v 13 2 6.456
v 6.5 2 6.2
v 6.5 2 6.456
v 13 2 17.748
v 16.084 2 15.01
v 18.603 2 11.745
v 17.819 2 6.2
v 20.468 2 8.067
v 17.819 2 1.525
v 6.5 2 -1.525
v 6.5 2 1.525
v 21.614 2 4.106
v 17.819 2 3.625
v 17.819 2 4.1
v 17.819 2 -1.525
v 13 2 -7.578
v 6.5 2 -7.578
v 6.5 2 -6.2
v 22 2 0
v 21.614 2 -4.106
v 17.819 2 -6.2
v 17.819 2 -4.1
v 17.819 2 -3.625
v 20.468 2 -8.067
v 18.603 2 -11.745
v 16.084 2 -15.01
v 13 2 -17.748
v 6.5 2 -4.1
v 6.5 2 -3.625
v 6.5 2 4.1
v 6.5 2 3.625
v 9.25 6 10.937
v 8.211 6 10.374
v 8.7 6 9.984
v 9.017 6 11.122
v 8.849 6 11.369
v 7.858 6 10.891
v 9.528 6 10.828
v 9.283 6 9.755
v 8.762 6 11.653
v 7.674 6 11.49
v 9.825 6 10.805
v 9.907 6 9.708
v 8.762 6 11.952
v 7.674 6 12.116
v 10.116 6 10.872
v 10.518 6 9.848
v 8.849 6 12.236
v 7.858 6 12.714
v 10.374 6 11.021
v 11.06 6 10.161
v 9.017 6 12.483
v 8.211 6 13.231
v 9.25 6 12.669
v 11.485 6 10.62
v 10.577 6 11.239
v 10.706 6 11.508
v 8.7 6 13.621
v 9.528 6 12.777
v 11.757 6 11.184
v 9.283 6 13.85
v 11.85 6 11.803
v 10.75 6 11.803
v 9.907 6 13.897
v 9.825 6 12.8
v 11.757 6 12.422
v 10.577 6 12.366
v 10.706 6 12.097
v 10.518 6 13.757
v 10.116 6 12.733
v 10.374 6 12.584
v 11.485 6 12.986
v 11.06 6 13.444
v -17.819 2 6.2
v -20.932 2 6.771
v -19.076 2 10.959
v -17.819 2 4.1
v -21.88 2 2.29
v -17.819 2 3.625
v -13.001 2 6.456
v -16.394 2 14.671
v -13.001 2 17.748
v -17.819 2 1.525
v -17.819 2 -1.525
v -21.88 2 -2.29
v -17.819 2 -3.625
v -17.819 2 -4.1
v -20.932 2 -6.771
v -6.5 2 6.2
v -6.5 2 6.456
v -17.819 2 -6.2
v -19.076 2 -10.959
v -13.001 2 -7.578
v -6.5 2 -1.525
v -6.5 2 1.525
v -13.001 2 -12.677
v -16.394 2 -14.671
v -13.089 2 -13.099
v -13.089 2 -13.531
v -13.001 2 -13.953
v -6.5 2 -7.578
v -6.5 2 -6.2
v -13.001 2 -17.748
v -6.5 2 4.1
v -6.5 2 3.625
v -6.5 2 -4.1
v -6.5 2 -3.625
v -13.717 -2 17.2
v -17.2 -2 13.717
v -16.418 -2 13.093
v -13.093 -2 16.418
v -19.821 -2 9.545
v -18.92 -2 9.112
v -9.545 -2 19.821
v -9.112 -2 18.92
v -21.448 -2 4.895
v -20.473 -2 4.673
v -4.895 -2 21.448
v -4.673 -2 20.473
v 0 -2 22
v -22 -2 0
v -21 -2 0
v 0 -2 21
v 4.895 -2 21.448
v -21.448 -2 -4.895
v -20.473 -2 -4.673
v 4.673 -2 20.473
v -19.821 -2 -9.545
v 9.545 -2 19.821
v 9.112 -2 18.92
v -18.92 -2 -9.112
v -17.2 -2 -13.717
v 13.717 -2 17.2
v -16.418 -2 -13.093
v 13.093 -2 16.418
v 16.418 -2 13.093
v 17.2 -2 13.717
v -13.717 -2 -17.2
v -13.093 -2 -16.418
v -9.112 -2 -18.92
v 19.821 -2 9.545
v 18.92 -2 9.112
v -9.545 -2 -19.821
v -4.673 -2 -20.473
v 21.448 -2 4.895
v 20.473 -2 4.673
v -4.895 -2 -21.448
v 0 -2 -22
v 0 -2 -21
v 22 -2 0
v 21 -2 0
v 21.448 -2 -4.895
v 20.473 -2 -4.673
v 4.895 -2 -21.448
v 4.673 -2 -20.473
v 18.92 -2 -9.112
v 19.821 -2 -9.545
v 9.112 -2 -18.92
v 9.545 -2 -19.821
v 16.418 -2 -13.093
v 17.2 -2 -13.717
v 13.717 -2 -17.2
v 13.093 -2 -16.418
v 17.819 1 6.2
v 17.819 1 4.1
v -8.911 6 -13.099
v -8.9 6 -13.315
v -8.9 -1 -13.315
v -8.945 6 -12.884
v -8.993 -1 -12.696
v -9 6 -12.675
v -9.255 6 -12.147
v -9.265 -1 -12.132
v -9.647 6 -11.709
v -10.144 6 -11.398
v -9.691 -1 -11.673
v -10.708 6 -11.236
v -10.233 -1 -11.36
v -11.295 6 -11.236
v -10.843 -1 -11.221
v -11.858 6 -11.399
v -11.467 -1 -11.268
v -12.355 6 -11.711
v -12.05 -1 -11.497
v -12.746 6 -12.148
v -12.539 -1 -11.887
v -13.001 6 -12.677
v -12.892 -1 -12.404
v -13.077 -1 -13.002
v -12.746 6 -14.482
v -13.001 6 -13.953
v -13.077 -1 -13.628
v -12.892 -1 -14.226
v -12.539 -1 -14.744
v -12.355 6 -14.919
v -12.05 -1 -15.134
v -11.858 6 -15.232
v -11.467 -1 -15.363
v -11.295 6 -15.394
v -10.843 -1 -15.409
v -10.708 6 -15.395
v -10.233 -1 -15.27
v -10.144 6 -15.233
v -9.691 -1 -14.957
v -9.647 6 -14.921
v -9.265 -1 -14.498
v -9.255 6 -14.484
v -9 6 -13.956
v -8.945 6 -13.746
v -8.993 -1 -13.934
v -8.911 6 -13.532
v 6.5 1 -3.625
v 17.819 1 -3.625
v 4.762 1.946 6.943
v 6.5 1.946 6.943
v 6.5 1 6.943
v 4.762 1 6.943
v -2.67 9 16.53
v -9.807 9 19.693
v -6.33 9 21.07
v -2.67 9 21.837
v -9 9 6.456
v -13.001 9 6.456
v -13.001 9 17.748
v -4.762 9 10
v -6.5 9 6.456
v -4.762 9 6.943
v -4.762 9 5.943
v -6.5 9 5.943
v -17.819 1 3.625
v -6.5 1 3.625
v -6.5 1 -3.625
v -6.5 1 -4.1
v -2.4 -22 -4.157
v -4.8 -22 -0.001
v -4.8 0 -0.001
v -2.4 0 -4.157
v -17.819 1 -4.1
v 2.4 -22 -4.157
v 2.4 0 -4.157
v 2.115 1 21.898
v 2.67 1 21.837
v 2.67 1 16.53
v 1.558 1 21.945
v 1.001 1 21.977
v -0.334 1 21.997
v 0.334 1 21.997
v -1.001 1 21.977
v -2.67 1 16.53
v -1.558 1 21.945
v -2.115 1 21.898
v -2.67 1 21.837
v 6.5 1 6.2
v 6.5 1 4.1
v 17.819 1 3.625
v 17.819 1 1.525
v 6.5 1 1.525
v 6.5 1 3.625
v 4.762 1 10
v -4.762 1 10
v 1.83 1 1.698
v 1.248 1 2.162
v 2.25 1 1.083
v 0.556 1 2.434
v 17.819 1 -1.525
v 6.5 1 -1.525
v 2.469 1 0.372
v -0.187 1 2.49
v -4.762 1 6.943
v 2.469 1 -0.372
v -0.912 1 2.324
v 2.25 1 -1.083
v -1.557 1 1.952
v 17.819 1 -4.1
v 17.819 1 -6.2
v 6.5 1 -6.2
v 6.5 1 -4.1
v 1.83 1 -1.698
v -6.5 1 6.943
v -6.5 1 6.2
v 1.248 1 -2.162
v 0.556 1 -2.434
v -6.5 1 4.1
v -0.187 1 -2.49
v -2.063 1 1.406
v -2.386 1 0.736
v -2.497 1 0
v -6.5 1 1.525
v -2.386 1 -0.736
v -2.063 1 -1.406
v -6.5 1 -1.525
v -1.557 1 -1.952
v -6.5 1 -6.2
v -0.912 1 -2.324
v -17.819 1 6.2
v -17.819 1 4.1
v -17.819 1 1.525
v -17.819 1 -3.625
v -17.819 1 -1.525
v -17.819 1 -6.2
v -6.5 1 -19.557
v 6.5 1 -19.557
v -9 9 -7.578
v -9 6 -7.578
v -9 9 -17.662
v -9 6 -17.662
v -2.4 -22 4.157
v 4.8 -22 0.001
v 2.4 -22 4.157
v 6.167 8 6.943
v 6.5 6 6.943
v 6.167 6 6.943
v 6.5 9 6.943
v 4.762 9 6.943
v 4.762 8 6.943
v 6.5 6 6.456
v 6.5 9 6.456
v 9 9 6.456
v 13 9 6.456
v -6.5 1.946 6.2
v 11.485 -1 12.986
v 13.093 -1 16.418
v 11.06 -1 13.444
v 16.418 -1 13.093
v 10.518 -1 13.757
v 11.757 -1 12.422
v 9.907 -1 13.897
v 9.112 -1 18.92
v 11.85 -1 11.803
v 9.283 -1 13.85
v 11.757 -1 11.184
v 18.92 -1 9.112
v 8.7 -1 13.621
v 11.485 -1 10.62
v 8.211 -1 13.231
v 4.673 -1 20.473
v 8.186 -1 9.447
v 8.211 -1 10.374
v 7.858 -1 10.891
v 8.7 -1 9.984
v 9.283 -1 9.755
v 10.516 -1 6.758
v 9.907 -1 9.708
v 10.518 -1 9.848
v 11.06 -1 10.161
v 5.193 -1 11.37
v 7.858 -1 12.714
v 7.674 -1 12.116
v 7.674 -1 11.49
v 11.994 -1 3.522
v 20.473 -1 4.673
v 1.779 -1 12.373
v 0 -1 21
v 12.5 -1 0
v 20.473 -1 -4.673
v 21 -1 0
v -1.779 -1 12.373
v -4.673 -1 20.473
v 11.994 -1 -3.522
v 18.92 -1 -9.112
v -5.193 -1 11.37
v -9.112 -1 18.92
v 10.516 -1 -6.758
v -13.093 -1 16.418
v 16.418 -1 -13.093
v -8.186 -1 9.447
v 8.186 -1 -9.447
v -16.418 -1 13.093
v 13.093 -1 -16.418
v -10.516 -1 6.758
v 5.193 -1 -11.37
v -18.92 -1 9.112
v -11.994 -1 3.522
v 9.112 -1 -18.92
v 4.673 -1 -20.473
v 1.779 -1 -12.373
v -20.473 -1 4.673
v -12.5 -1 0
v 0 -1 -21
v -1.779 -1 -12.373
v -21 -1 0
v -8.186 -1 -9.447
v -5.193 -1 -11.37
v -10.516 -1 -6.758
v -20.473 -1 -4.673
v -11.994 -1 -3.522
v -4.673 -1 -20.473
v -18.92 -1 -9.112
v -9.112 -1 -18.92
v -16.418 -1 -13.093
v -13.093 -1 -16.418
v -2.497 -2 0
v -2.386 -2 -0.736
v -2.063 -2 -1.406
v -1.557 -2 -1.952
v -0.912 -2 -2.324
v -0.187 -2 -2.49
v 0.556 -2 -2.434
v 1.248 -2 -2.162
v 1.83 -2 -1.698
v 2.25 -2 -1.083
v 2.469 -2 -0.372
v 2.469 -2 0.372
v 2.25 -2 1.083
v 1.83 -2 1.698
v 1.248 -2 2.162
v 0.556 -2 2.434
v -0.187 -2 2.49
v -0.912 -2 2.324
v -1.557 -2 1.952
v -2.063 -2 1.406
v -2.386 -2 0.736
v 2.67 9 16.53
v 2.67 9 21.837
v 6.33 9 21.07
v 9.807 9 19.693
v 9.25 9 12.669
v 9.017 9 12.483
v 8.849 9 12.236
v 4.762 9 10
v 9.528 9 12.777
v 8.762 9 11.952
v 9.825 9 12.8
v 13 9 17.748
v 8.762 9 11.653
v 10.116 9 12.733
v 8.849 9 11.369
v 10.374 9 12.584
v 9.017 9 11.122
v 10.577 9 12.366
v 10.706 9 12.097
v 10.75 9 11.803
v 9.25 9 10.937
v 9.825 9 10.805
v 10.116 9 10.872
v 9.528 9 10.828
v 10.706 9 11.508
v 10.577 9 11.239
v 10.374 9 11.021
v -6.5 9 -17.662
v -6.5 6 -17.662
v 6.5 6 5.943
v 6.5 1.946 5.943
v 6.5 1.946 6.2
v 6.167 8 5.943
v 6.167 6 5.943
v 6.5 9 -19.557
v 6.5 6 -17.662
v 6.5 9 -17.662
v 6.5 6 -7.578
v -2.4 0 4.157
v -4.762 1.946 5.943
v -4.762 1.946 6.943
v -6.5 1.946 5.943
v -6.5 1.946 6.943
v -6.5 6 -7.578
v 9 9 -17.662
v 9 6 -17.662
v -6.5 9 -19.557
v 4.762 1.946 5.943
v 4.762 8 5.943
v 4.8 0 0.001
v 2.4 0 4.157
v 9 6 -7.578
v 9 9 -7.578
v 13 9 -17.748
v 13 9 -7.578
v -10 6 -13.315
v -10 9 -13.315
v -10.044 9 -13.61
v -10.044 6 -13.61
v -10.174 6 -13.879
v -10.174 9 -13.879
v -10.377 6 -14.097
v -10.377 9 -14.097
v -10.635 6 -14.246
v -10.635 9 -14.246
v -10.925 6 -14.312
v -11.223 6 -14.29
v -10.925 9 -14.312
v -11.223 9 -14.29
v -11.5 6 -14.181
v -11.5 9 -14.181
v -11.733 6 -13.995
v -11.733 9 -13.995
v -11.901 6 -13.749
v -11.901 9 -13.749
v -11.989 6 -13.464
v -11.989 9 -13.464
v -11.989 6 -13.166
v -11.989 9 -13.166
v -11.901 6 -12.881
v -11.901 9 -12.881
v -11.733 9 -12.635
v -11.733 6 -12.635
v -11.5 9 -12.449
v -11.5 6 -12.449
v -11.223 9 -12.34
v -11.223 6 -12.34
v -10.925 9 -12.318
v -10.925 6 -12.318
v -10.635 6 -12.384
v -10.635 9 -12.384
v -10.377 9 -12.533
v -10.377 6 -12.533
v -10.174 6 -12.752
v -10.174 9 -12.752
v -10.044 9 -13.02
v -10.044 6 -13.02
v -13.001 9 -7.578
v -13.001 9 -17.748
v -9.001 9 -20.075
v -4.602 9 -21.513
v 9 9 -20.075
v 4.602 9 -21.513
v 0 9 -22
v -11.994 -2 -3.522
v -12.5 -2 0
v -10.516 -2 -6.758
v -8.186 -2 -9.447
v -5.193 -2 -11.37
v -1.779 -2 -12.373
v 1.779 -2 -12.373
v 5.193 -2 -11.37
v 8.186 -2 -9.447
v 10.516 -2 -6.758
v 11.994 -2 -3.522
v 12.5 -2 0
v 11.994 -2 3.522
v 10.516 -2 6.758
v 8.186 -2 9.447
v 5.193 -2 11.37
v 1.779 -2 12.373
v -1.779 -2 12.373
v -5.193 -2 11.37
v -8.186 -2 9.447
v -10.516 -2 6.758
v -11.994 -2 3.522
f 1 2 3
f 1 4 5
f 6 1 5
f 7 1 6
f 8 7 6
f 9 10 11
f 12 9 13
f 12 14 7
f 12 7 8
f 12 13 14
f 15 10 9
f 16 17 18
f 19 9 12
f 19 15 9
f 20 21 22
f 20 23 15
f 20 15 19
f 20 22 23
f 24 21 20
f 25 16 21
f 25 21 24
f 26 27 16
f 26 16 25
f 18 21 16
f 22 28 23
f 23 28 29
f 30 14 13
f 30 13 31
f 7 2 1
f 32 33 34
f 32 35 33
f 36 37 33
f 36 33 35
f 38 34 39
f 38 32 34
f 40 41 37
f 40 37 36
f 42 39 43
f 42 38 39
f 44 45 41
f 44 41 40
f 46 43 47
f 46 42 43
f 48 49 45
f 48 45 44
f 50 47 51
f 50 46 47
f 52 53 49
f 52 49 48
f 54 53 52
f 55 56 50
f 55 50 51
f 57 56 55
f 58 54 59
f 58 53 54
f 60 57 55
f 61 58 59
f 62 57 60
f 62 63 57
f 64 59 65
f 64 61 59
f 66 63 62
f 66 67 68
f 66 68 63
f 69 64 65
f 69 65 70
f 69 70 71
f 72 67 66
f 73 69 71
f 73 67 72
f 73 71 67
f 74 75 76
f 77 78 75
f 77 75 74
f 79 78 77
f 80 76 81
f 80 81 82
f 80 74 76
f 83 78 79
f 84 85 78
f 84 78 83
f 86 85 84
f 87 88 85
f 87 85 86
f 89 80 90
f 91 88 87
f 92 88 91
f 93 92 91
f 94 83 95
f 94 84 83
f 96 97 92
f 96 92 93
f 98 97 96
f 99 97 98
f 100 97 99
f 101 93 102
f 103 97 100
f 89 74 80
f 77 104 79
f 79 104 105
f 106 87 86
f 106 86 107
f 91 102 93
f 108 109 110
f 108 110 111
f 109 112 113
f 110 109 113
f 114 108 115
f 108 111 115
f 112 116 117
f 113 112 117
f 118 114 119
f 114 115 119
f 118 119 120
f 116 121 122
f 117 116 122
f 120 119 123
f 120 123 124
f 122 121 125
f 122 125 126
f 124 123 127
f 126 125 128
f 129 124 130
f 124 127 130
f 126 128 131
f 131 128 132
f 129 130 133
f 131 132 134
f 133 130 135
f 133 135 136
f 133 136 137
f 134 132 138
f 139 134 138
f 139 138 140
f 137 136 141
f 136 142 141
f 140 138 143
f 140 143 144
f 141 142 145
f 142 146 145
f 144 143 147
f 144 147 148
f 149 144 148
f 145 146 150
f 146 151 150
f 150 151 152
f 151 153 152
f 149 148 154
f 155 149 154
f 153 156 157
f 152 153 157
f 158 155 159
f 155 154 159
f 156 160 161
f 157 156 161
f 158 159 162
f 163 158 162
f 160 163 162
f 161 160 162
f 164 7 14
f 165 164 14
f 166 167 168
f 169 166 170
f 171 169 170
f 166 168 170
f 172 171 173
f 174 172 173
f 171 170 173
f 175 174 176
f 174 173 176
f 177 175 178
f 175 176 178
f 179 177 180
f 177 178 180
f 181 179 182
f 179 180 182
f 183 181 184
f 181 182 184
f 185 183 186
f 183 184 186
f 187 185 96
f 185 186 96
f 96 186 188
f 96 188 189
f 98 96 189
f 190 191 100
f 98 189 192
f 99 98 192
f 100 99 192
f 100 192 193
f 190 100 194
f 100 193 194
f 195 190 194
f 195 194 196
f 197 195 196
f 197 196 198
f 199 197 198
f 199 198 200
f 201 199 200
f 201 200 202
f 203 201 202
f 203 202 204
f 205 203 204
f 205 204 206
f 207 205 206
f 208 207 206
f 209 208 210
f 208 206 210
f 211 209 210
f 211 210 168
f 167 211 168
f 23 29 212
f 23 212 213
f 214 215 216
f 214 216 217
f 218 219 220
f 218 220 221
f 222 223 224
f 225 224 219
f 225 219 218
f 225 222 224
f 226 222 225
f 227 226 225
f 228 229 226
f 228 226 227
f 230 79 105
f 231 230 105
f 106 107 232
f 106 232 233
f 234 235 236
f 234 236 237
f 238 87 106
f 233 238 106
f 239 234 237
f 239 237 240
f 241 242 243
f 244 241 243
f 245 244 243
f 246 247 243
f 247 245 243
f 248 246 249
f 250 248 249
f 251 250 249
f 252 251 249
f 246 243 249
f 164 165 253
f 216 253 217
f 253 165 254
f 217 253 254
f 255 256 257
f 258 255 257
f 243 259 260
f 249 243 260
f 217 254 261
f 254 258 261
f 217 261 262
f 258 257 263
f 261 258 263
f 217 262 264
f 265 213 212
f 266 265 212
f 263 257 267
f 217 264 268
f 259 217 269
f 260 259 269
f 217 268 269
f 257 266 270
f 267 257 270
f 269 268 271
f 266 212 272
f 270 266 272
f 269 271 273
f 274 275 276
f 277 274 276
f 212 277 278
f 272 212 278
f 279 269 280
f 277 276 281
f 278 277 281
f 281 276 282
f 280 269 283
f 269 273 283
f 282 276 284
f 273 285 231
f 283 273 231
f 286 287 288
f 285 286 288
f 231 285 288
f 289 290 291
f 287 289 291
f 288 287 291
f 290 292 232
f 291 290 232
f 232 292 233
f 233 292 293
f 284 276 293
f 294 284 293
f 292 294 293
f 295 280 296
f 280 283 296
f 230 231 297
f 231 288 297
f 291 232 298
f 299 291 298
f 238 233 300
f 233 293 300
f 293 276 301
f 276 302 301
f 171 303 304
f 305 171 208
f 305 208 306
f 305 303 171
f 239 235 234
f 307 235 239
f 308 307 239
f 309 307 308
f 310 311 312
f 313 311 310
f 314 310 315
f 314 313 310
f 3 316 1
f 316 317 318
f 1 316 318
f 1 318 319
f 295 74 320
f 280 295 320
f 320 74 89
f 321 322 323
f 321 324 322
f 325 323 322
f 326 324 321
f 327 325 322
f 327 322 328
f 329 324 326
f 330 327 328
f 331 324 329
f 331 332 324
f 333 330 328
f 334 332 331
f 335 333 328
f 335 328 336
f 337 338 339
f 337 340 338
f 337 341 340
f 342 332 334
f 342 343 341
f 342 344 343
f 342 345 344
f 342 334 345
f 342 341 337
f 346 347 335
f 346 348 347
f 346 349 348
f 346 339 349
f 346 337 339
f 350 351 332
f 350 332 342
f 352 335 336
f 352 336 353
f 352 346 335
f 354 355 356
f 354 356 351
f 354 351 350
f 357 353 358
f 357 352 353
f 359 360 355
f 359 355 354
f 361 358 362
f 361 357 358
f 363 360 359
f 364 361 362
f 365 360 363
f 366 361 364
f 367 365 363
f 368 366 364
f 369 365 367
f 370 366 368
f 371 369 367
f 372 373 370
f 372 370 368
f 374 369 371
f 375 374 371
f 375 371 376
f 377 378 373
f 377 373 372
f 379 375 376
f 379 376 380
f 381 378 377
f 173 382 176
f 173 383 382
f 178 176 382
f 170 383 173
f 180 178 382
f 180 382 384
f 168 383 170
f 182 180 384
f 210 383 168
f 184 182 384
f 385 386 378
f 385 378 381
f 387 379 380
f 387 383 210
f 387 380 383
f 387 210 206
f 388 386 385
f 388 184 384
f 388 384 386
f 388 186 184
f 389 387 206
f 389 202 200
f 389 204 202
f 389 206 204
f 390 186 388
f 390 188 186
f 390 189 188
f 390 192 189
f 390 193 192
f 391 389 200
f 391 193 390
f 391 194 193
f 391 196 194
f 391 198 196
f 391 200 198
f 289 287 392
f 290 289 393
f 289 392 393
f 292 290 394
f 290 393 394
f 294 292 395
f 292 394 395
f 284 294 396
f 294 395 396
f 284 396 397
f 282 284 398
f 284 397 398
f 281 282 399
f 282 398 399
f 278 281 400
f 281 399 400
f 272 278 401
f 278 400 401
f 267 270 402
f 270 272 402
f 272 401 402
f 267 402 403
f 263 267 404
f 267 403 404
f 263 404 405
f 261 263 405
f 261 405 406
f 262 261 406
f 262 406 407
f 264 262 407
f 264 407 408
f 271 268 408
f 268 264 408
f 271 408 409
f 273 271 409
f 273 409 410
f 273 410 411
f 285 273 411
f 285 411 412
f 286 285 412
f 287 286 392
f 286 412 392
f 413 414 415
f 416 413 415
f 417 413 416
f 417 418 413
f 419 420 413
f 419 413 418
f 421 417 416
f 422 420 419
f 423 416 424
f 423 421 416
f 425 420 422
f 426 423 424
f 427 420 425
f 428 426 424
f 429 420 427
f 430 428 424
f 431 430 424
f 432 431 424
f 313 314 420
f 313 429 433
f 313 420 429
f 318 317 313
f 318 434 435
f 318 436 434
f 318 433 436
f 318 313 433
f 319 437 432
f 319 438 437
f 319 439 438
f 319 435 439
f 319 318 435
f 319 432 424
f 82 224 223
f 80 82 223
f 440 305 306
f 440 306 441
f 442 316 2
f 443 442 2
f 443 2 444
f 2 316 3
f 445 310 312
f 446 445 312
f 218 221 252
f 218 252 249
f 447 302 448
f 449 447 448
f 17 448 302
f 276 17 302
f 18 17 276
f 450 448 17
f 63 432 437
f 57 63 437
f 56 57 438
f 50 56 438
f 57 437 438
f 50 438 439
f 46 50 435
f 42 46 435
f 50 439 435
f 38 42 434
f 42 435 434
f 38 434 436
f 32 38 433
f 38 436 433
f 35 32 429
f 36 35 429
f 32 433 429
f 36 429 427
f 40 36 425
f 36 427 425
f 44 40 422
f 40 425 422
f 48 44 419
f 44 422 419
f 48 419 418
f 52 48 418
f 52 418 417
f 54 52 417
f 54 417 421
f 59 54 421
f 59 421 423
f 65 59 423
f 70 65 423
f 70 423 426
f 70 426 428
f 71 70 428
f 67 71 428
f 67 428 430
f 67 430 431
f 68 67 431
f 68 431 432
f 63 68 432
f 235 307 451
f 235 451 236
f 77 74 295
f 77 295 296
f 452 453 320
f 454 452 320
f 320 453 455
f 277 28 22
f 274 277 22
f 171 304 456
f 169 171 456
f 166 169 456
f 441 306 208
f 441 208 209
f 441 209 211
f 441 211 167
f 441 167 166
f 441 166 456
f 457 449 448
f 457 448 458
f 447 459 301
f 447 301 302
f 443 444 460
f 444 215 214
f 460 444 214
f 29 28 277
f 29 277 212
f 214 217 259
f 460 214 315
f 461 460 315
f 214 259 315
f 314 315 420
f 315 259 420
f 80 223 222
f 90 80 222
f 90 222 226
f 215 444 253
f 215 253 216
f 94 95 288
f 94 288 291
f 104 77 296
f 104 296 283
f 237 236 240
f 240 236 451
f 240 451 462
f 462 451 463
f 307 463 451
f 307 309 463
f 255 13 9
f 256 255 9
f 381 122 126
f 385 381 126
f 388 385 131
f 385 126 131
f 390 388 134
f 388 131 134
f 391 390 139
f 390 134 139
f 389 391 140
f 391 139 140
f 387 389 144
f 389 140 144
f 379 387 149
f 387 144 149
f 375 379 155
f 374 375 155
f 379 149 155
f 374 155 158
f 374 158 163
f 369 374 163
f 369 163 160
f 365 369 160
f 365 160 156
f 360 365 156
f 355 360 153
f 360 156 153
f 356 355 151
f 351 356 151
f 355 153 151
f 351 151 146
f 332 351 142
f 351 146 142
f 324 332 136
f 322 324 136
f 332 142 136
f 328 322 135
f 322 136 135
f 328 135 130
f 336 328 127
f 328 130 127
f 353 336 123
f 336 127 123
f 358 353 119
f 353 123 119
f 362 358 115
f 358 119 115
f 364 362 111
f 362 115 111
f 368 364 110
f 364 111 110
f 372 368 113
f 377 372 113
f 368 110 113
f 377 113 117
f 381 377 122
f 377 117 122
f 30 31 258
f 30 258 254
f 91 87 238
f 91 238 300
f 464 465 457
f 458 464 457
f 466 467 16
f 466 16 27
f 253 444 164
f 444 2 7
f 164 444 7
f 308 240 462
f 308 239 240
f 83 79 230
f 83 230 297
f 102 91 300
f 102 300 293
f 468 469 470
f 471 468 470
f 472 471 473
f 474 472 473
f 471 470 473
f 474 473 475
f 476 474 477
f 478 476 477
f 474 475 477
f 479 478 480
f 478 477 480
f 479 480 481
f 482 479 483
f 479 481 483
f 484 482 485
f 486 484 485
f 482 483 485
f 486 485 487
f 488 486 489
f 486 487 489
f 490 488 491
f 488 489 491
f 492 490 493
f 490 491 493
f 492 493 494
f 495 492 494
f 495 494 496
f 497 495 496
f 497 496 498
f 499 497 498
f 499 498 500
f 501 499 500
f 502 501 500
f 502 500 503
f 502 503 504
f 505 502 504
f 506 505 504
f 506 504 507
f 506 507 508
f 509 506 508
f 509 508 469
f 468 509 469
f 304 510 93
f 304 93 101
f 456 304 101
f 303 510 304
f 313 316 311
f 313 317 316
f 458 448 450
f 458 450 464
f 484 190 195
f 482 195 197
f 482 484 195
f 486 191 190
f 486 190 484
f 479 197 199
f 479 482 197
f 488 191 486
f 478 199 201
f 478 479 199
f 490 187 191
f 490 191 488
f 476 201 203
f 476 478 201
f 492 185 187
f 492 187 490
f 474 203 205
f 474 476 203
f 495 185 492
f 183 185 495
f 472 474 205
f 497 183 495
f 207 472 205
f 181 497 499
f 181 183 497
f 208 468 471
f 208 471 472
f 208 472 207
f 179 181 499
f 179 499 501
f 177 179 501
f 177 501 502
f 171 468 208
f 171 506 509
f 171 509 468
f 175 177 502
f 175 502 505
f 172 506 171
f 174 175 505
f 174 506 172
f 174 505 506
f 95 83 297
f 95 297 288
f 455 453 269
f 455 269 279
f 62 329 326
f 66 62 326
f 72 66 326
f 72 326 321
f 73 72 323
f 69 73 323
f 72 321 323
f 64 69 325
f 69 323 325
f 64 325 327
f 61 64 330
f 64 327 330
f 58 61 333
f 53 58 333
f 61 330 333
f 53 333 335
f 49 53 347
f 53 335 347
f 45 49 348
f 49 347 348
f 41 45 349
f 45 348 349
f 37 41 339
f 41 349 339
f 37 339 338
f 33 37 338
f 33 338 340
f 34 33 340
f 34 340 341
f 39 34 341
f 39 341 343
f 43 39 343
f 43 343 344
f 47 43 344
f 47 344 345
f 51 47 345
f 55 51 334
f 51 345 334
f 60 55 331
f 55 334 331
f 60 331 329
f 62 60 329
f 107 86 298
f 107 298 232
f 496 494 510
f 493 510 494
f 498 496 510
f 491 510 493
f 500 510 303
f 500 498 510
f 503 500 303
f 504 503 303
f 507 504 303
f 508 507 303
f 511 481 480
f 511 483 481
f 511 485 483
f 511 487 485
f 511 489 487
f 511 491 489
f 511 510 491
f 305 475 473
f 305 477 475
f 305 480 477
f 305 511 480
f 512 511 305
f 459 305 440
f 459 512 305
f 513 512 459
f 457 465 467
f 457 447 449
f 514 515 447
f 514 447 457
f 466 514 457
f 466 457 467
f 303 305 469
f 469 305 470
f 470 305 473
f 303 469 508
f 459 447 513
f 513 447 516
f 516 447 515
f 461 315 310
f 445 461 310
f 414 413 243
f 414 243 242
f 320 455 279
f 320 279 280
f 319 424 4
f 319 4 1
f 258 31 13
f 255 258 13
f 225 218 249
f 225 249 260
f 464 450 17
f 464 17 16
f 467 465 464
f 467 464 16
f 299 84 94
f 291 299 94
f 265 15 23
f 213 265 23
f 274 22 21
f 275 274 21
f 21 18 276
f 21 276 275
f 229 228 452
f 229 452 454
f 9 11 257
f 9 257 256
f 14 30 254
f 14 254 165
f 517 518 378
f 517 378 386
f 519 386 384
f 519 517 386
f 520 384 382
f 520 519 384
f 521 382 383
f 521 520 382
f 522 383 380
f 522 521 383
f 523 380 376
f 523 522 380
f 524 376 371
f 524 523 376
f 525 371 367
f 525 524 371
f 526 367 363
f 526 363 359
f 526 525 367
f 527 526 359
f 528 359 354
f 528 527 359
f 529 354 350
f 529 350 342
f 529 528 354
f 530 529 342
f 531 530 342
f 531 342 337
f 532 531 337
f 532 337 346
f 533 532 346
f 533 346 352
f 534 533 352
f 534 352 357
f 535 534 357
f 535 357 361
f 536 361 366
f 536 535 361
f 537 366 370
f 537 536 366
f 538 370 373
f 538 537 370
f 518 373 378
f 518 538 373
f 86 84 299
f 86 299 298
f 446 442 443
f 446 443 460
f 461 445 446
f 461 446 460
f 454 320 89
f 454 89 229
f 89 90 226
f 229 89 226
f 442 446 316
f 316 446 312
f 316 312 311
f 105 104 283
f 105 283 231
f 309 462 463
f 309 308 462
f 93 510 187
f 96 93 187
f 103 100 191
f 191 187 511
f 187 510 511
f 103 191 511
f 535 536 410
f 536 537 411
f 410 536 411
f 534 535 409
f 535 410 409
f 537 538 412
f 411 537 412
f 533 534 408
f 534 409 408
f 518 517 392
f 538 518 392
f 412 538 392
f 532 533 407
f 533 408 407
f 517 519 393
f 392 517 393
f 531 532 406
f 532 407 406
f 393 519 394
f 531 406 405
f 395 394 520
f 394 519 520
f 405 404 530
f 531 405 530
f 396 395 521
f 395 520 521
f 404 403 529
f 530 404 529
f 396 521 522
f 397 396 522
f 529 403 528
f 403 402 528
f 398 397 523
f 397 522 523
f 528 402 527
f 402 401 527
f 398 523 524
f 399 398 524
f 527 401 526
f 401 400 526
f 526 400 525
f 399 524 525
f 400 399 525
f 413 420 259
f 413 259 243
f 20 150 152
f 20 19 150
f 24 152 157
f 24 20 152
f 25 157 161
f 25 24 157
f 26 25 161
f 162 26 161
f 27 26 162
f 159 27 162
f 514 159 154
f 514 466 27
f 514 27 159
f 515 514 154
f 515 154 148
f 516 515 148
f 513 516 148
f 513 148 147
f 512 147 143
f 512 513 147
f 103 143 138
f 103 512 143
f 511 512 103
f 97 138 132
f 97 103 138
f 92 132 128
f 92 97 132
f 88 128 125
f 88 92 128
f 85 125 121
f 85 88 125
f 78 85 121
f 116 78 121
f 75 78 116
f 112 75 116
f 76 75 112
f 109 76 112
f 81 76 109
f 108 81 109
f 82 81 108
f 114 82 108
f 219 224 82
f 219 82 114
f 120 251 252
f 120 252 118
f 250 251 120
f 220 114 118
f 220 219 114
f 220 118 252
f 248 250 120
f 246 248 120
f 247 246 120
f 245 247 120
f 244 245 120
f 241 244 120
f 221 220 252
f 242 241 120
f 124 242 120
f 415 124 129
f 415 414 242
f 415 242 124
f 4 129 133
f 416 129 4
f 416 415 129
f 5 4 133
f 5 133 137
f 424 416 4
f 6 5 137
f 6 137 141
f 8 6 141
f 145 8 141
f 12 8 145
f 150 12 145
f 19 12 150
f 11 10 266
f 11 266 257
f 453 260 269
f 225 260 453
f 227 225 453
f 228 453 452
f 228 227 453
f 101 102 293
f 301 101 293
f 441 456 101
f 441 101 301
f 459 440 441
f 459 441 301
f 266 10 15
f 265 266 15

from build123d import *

# Parameters (mm, degrees)
SKETCH1_R                = 22
BOSS_EXTRUDE1_DEPTH      = 9
BOSS_EXTRUDE1_DEPTH_BACK = 2
SKETCH6_R                = 21
SKETCH6_R_2              = 12.5
CUT_EXTRUDE5_DEPTH       = 1
SKETCH7_R                = 8.5
BOSS_EXTRUDE2_DEPTH      = 40
SKETCH8_R                = 1.5
CUT_EXTRUDE6_DEPTH       = 41
CUT_EXTRUDE6_DEPTH_BACK  = 12
CUT_EXTRUDE7_DEPTH       = 7
SKETCH17_R               = 2.496785081
CUT_EXTRUDE14_DEPTH      = 62
SKETCH29_W               = 18
SKETCH29_H               = 24.118038922
CUT_EXTRUDE19_DEPTH      = 3
SKETCH30_W               = 2.5
SKETCH30_H               = 14
CUT_EXTRUDE20_DEPTH      = 6
SKETCH35_R               = 9.1
SKETCH35_R_2             = 8.5
BOSS_EXTRUDE4_DEPTH      = 2
BOSS_EXTRUDE4_DEPTH_BACK = 2
SKETCH36_R               = 8.5
SKETCH36_R_2             = 8.3
CUT_EXTRUDE28_DEPTH      = 1.5
CUT_EXTRUDE28_DEPTH_BACK = 1.5
SKETCH39_R               = 8.5
SKETCH39_R_2             = 8.3
CUT_EXTRUDE30_DEPTH      = 1.5
CUT_EXTRUDE30_DEPTH_BACK = 1.5
SKETCH40_R               = 8.5
SKETCH40_R_2             = 8.3
CUT_EXTRUDE31_DEPTH      = 1.5
CUT_EXTRUDE31_DEPTH_BACK = 1.5
SKETCH41_R               = 8.5
SKETCH41_R_2             = 8.35
CUT_EXTRUDE32_DEPTH      = 1.5
CUT_EXTRUDE32_DEPTH_BACK = 1.5
SKETCH42_R               = 8.5
SKETCH42_R_2             = 8.3
CUT_EXTRUDE33_DEPTH      = 1.5
CUT_EXTRUDE33_DEPTH_BACK = 1.5
SKETCH43_R               = 8.5
SKETCH43_R_2             = 8.3
CUT_EXTRUDE34_DEPTH      = 1.5
CUT_EXTRUDE34_DEPTH_BACK = 1.5
SKETCH44_R               = 1
CUT_EXTRUDE35_DEPTH      = 23
CUT_EXTRUDE35_DEPTH_BACK = 23
SKETCH45_R               = 1
CUT_EXTRUDE36_DEPTH      = 31.052558883
CUT_EXTRUDE36_DEPTH_BACK = 31.052558883
SKETCH46_R               = 1
CUT_EXTRUDE37_DEPTH      = 31.052558883
CUT_EXTRUDE37_DEPTH_BACK = 31.052558883
SKETCH47_W               = 27.732128476
SKETCH47_H               = 14.033639909
CUT_EXTRUDE38_DEPTH      = 7
CUT_EXTRUDE39_DEPTH      = 8
SKETCH48_R               = 1
CUT_EXTRUDE40_DEPTH      = 9
SKETCH50_R               = 6.388253867
BOSS_EXTRUDE5_DEPTH      = 2
SKETCH49_R               = 2.1
CUT_EXTRUDE42_DEPTH      = 7
SKETCH51_W               = 35.63730279
SKETCH51_H               = 2.1
CUT_EXTRUDE43_DEPTH      = 1
SKETCH53_R               = 9.1
CUT_EXTRUDE45_DEPTH      = 40
SKETCH55_W               = 1.737607108
SKETCH55_H               = 7.054348591
BOSS_EXTRUDE6_DEPTH      = 1
BOSS_EXTRUDE9_DEPTH      = 20
BOSS_EXTRUDE9_DEPTH_BACK = 2


with BuildPart() as part:
    # Sketch1 → Boss-Extrude1 (new body, two sides)
    with BuildSketch(Plane(origin=(0, 0, 0), x_dir=(1, 0, 0), z_dir=(0, 1, 0))) as boss_extrude1_sk:
        Circle(SKETCH1_R)
    extrude(amount=BOSS_EXTRUDE1_DEPTH)
    extrude(boss_extrude1_sk.sketch, amount=-BOSS_EXTRUDE1_DEPTH_BACK)

    # Sketch6 → Cut-Extrude5 (cut)
    with BuildSketch(Plane(origin=(0, -2, 0), x_dir=(-1, 0, 0), z_dir=(0, -1, 0))):
        Circle(SKETCH6_R)
        Circle(SKETCH6_R_2, mode=Mode.SUBTRACT)
    extrude(amount=-CUT_EXTRUDE5_DEPTH, mode=Mode.SUBTRACT)

    # Sketch7 → Boss-Extrude2 (add)
    with BuildSketch(Plane(origin=(0, -2, 0), x_dir=(-1, 0, 0), z_dir=(0, -1, 0))):
        Circle(SKETCH7_R)
    extrude(amount=BOSS_EXTRUDE2_DEPTH)

    # Sketch8 → Cut-Extrude6 (cut, two sides)
    with BuildSketch(Plane(origin=(0, -2, 0), x_dir=(-1, 0, 0), z_dir=(0, -1, 0))) as cut_extrude6_sk:
        Circle(SKETCH8_R)
    extrude(amount=CUT_EXTRUDE6_DEPTH, mode=Mode.SUBTRACT)
    extrude(cut_extrude6_sk.sketch, amount=-CUT_EXTRUDE6_DEPTH_BACK, mode=Mode.SUBTRACT)

    # Sketch9 → Cut-Extrude7 (cut)
    with BuildSketch(Plane(origin=(0, 9, 0), x_dir=(1, 0, 0), z_dir=(0, 1, 0))):
        with BuildLine():
            Line((-13.000713231, -20.359249211), (-13.000713231, 20.359249211))
            ThreePointArc((-13.000713231, 20.359249211), (-24.156108398, 0), (-13.000713231, -20.359249211))
        make_face()
        with BuildLine():
            Line((13, -20.359704638), (13, 20.359704638))
            ThreePointArc((13, 20.359704638), (24.156108398, 0), (13, -20.359704638))
        make_face()
    extrude(amount=-CUT_EXTRUDE7_DEPTH, mode=Mode.SUBTRACT)

    # Sketch17 → Cut-Extrude14 (cut)
    with BuildSketch(Plane(origin=(0, -42, 0), x_dir=(-1, 0, 0), z_dir=(0, -1, 0))):
        Circle(SKETCH17_R)
    extrude(amount=-CUT_EXTRUDE14_DEPTH, mode=Mode.SUBTRACT)

    # Sketch29 → Cut-Extrude19 (cut)
    with BuildSketch(Plane(origin=(0, 9, 0), x_dir=(1, 0, 0), z_dir=(0, 1, 0))):
        with Locations((0, 5.603215798)):
            Rectangle(SKETCH29_W, SKETCH29_H)
    extrude(amount=-CUT_EXTRUDE19_DEPTH, mode=Mode.SUBTRACT)

    # Sketch30 → Cut-Extrude20 (cut)
    with BuildSketch(Plane(origin=(0, 9, 0), x_dir=(1, 0, 0), z_dir=(0, 1, 0))):
        with Locations((6.752146467, 0.544196337)):
            Rectangle(SKETCH30_W, SKETCH30_H)
        with Locations((-6.752146467, 0.544196337)):
            Rectangle(SKETCH30_W, SKETCH30_H)
    extrude(amount=-CUT_EXTRUDE20_DEPTH, mode=Mode.SUBTRACT)

    # Sketch35 → Boss-Extrude4 (add, two sides)
    with BuildSketch(Plane(origin=(0, -6.5, 0), x_dir=(1, 0, 0), z_dir=(0, 1, 0))) as boss_extrude4_sk:
        Circle(SKETCH35_R)
        Circle(SKETCH35_R_2, mode=Mode.SUBTRACT)
    extrude(amount=BOSS_EXTRUDE4_DEPTH)
    extrude(boss_extrude4_sk.sketch, amount=-BOSS_EXTRUDE4_DEPTH_BACK)

    # Sketch36 → Cut-Extrude28 (cut, two sides)
    with BuildSketch(Plane(origin=(0, -17, 0), x_dir=(1, 0, 0), z_dir=(0, 1, 0))) as cut_extrude28_sk:
        Circle(SKETCH36_R)
        Circle(SKETCH36_R_2, mode=Mode.SUBTRACT)
    extrude(amount=CUT_EXTRUDE28_DEPTH, mode=Mode.SUBTRACT)
    extrude(cut_extrude28_sk.sketch, amount=-CUT_EXTRUDE28_DEPTH_BACK, mode=Mode.SUBTRACT)

    # Sketch39 → Cut-Extrude30 (cut, two sides)
    with BuildSketch(Plane(origin=(0, -21, 0), x_dir=(1, 0, 0), z_dir=(0, 1, 0))) as cut_extrude30_sk:
        Circle(SKETCH39_R)
        Circle(SKETCH39_R_2, mode=Mode.SUBTRACT)
    extrude(amount=CUT_EXTRUDE30_DEPTH, mode=Mode.SUBTRACT)
    extrude(cut_extrude30_sk.sketch, amount=-CUT_EXTRUDE30_DEPTH_BACK, mode=Mode.SUBTRACT)

    # Sketch40 → Cut-Extrude31 (cut, two sides)
    with BuildSketch(Plane(origin=(0, -25, 0), x_dir=(1, 0, 0), z_dir=(0, 1, 0))) as cut_extrude31_sk:
        Circle(SKETCH40_R)
        Circle(SKETCH40_R_2, mode=Mode.SUBTRACT)
    extrude(amount=CUT_EXTRUDE31_DEPTH, mode=Mode.SUBTRACT)
    extrude(cut_extrude31_sk.sketch, amount=-CUT_EXTRUDE31_DEPTH_BACK, mode=Mode.SUBTRACT)

    # Sketch41 → Cut-Extrude32 (cut, two sides)
    with BuildSketch(Plane(origin=(0, -29, 0), x_dir=(1, 0, 0), z_dir=(0, 1, 0))) as cut_extrude32_sk:
        Circle(SKETCH41_R)
        Circle(SKETCH41_R_2, mode=Mode.SUBTRACT)
    extrude(amount=CUT_EXTRUDE32_DEPTH, mode=Mode.SUBTRACT)
    extrude(cut_extrude32_sk.sketch, amount=-CUT_EXTRUDE32_DEPTH_BACK, mode=Mode.SUBTRACT)

    # Sketch42 → Cut-Extrude33 (cut, two sides)
    with BuildSketch(Plane(origin=(0, -33, 0), x_dir=(1, 0, 0), z_dir=(0, 1, 0))) as cut_extrude33_sk:
        Circle(SKETCH42_R)
        Circle(SKETCH42_R_2, mode=Mode.SUBTRACT)
    extrude(amount=CUT_EXTRUDE33_DEPTH, mode=Mode.SUBTRACT)
    extrude(cut_extrude33_sk.sketch, amount=-CUT_EXTRUDE33_DEPTH_BACK, mode=Mode.SUBTRACT)

    # Sketch43 → Cut-Extrude34 (cut, two sides)
    with BuildSketch(Plane(origin=(0, -37, 0), x_dir=(1, 0, 0), z_dir=(0, 1, 0))) as cut_extrude34_sk:
        Circle(SKETCH43_R)
        Circle(SKETCH43_R_2, mode=Mode.SUBTRACT)
    extrude(amount=CUT_EXTRUDE34_DEPTH, mode=Mode.SUBTRACT)
    extrude(cut_extrude34_sk.sketch, amount=-CUT_EXTRUDE34_DEPTH_BACK, mode=Mode.SUBTRACT)

    # Sketch44 → Cut-Extrude35 (cut, two sides)
    with BuildSketch(Plane.XY) as cut_extrude35_sk:
        with Locations((0, -16.975647938)):
            Circle(SKETCH44_R)
        with Locations((0, -29.042179734)):
            Circle(SKETCH44_R)
    extrude(amount=CUT_EXTRUDE35_DEPTH, mode=Mode.SUBTRACT)
    extrude(cut_extrude35_sk.sketch, amount=-CUT_EXTRUDE35_DEPTH_BACK, mode=Mode.SUBTRACT)

    # Sketch45 → Cut-Extrude36 (cut, two sides)
    with BuildSketch(Plane(origin=(0, 0, 0), x_dir=(0, 1, 0), z_dir=(0.866025404, 0, 0.5))) as cut_extrude36_sk:
        with Locations((-21.101513607, 0)):
            Circle(SKETCH45_R)
        with Locations((-33.049455879, 0)):
            Circle(SKETCH45_R)
    extrude(amount=CUT_EXTRUDE36_DEPTH, mode=Mode.SUBTRACT)
    extrude(cut_extrude36_sk.sketch, amount=-CUT_EXTRUDE36_DEPTH_BACK, mode=Mode.SUBTRACT)

    # Sketch46 → Cut-Extrude37 (cut, two sides)
    with BuildSketch(Plane(origin=(0, 0, 0), x_dir=(0, 1, 0), z_dir=(0.866025404, 0, -0.5))) as cut_extrude37_sk:
        with Locations((-24.961001523, 0)):
            Circle(SKETCH46_R)
        with Locations((-37.130366549, 0)):
            Circle(SKETCH46_R)
    extrude(amount=CUT_EXTRUDE37_DEPTH, mode=Mode.SUBTRACT)
    extrude(cut_extrude37_sk.sketch, amount=-CUT_EXTRUDE37_DEPTH_BACK, mode=Mode.SUBTRACT)

    # Sketch47 → Cut-Extrude38 (cut)
    with BuildSketch(Plane(origin=(0, 9, 0), x_dir=(1, 0, 0), z_dir=(0, 1, 0))):
        with Locations((-0.011675811, 0.561016292)):
            Rectangle(SKETCH47_W, SKETCH47_H)
    extrude(amount=-CUT_EXTRUDE38_DEPTH, mode=Mode.SUBTRACT)

    # Sketch23 → Cut-Extrude39 (cut)
    with BuildSketch(Plane(origin=(0, 9, 0), x_dir=(1, 0, 0), z_dir=(0, 1, 0))):
        with BuildLine():
            Line((-2.670420152, -16.85816067), (-2.670420152, -16.530371213))
            Line((-2.670420152, -16.530371213), (-4.762392892, -10))
            Line((-4.762392892, -10), (-4.762392892, -6.943148259))
            Line((-4.762392892, -6.943148259), (-6.5, -6.943148259))
            Line((-6.5, -6.943148259), (-6.5, 19.556851741))
            Line((-6.5, 19.556851741), (6.5, 19.556851741))
            Line((6.5, 19.556851741), (6.5, -6.943148259))
            Line((6.5, -6.943148259), (4.762392892, -6.943148259))
            Line((4.762392892, -6.943148259), (4.762392892, -10))
            Line((4.762392892, -10), (2.670420152, -16.530371213))
            Line((2.670420152, -16.530371213), (2.670420152, -16.85816067))
            Line((2.670420152, -16.85816067), (2.670420152, -21.837327131))
            ThreePointArc((2.670420152, -21.837327131), (1.836835043, -21.92318492), (1.000584871, -21.977234355))
            Line((1.000584871, -21.977234355), (0, -25.25))
            Line((0, -25.25), (-1.000584871, -21.977234355))
            ThreePointArc((-1.000584871, -21.977234355), (-1.836835043, -21.92318492), (-2.670420152, -21.837327131))
            Line((-2.670420152, -21.837327131), (-2.670420152, -16.85816067))
        make_face()
    extrude(amount=-CUT_EXTRUDE39_DEPTH, mode=Mode.SUBTRACT)

    # Sketch48 → Cut-Extrude40 (cut)
    with BuildSketch(Plane(origin=(0, 9, 0), x_dir=(1, 0, 0), z_dir=(0, 1, 0))):
        with Locations((-11, 13.315197565)):
            Circle(SKETCH48_R)
        with Locations((9.750356615, -11.802538605)):
            Circle(SKETCH48_R)
    extrude(amount=-CUT_EXTRUDE40_DEPTH, mode=Mode.SUBTRACT)

    # Sketch50 → Boss-Extrude5 (add)
    with BuildSketch(Plane.XZ.offset(42)):
        Circle(SKETCH50_R)
        Polygon((-4.989659815, -0.000576747), (-2.49433043, -4.321460529), (2.495329385, -4.320883782), (4.989659815, 0.000576747), (2.49433043, 4.321460529), (-2.495329385, 4.320883782), align=None, mode=Mode.SUBTRACT)
    extrude(amount=-BOSS_EXTRUDE5_DEPTH)

    # Sketch49 → Cut-Extrude42 (cut)
    with BuildSketch(Plane.XZ.offset(1)):
        with Locations((-11, -13.315197565)):
            Circle(SKETCH49_R)
        with Locations((9.750356615, 11.802538605)):
            Circle(SKETCH49_R)
    extrude(amount=-CUT_EXTRUDE42_DEPTH, mode=Mode.SUBTRACT)

    # Sketch51 → Cut-Extrude43 (cut)
    with BuildSketch(Plane(origin=(0, 2, 0), x_dir=(1, 0, 0), z_dir=(0, 1, 0))):
        with Locations((0, 5.15)):
            Rectangle(SKETCH51_W, SKETCH51_H)
        with Locations((0, 2.575)):
            Rectangle(SKETCH51_W, SKETCH51_H)
        with Locations((0, -2.575)):
            Rectangle(SKETCH51_W, SKETCH51_H)
        with Locations((0, -5.15)):
            Rectangle(SKETCH51_W, SKETCH51_H)
    extrude(amount=-CUT_EXTRUDE43_DEPTH, mode=Mode.SUBTRACT)

    # Sketch53 → Cut-Extrude45 (cut)
    with BuildSketch(Plane.XZ.offset(42)):
        Circle(SKETCH53_R)
    extrude(amount=-CUT_EXTRUDE45_DEPTH, mode=Mode.SUBTRACT)

    # Sketch55 → Boss-Extrude6 (add)
    with BuildSketch(Plane(origin=(0, 0, 6.943148259), x_dir=(-1, 0, 0), z_dir=(0, 0, -1))):
        Polygon((-4.762392892, 8), (-6.167287474, 8), (-6.167287474, 6), (-6.5, 6), (-6.5, 1.945651409), (-4.762392892, 1.945651409), align=None)
        with Locations((5.631196446, 5.472825704)):
            Rectangle(SKETCH55_W, SKETCH55_H)
    extrude(amount=BOSS_EXTRUDE6_DEPTH)


with BuildPart() as body_2:
    # Sketch56 → Boss-Extrude9 (new body, two sides)
    with BuildSketch(Plane.XZ.offset(2)) as boss_extrude9_sk:
        Polygon((2.399519492, 4.157199323), (-2.400480476, 4.156644498), (-4.799999968, -0.000554824), (-2.399519492, -4.157199323), (2.400480476, -4.156644498), (4.799999968, 0.000554824), align=None)
    extrude(amount=BOSS_EXTRUDE9_DEPTH)
    extrude(boss_extrude9_sk.sketch, amount=-BOSS_EXTRUDE9_DEPTH_BACK)


solid = Compound([part.part, body_2.part])
